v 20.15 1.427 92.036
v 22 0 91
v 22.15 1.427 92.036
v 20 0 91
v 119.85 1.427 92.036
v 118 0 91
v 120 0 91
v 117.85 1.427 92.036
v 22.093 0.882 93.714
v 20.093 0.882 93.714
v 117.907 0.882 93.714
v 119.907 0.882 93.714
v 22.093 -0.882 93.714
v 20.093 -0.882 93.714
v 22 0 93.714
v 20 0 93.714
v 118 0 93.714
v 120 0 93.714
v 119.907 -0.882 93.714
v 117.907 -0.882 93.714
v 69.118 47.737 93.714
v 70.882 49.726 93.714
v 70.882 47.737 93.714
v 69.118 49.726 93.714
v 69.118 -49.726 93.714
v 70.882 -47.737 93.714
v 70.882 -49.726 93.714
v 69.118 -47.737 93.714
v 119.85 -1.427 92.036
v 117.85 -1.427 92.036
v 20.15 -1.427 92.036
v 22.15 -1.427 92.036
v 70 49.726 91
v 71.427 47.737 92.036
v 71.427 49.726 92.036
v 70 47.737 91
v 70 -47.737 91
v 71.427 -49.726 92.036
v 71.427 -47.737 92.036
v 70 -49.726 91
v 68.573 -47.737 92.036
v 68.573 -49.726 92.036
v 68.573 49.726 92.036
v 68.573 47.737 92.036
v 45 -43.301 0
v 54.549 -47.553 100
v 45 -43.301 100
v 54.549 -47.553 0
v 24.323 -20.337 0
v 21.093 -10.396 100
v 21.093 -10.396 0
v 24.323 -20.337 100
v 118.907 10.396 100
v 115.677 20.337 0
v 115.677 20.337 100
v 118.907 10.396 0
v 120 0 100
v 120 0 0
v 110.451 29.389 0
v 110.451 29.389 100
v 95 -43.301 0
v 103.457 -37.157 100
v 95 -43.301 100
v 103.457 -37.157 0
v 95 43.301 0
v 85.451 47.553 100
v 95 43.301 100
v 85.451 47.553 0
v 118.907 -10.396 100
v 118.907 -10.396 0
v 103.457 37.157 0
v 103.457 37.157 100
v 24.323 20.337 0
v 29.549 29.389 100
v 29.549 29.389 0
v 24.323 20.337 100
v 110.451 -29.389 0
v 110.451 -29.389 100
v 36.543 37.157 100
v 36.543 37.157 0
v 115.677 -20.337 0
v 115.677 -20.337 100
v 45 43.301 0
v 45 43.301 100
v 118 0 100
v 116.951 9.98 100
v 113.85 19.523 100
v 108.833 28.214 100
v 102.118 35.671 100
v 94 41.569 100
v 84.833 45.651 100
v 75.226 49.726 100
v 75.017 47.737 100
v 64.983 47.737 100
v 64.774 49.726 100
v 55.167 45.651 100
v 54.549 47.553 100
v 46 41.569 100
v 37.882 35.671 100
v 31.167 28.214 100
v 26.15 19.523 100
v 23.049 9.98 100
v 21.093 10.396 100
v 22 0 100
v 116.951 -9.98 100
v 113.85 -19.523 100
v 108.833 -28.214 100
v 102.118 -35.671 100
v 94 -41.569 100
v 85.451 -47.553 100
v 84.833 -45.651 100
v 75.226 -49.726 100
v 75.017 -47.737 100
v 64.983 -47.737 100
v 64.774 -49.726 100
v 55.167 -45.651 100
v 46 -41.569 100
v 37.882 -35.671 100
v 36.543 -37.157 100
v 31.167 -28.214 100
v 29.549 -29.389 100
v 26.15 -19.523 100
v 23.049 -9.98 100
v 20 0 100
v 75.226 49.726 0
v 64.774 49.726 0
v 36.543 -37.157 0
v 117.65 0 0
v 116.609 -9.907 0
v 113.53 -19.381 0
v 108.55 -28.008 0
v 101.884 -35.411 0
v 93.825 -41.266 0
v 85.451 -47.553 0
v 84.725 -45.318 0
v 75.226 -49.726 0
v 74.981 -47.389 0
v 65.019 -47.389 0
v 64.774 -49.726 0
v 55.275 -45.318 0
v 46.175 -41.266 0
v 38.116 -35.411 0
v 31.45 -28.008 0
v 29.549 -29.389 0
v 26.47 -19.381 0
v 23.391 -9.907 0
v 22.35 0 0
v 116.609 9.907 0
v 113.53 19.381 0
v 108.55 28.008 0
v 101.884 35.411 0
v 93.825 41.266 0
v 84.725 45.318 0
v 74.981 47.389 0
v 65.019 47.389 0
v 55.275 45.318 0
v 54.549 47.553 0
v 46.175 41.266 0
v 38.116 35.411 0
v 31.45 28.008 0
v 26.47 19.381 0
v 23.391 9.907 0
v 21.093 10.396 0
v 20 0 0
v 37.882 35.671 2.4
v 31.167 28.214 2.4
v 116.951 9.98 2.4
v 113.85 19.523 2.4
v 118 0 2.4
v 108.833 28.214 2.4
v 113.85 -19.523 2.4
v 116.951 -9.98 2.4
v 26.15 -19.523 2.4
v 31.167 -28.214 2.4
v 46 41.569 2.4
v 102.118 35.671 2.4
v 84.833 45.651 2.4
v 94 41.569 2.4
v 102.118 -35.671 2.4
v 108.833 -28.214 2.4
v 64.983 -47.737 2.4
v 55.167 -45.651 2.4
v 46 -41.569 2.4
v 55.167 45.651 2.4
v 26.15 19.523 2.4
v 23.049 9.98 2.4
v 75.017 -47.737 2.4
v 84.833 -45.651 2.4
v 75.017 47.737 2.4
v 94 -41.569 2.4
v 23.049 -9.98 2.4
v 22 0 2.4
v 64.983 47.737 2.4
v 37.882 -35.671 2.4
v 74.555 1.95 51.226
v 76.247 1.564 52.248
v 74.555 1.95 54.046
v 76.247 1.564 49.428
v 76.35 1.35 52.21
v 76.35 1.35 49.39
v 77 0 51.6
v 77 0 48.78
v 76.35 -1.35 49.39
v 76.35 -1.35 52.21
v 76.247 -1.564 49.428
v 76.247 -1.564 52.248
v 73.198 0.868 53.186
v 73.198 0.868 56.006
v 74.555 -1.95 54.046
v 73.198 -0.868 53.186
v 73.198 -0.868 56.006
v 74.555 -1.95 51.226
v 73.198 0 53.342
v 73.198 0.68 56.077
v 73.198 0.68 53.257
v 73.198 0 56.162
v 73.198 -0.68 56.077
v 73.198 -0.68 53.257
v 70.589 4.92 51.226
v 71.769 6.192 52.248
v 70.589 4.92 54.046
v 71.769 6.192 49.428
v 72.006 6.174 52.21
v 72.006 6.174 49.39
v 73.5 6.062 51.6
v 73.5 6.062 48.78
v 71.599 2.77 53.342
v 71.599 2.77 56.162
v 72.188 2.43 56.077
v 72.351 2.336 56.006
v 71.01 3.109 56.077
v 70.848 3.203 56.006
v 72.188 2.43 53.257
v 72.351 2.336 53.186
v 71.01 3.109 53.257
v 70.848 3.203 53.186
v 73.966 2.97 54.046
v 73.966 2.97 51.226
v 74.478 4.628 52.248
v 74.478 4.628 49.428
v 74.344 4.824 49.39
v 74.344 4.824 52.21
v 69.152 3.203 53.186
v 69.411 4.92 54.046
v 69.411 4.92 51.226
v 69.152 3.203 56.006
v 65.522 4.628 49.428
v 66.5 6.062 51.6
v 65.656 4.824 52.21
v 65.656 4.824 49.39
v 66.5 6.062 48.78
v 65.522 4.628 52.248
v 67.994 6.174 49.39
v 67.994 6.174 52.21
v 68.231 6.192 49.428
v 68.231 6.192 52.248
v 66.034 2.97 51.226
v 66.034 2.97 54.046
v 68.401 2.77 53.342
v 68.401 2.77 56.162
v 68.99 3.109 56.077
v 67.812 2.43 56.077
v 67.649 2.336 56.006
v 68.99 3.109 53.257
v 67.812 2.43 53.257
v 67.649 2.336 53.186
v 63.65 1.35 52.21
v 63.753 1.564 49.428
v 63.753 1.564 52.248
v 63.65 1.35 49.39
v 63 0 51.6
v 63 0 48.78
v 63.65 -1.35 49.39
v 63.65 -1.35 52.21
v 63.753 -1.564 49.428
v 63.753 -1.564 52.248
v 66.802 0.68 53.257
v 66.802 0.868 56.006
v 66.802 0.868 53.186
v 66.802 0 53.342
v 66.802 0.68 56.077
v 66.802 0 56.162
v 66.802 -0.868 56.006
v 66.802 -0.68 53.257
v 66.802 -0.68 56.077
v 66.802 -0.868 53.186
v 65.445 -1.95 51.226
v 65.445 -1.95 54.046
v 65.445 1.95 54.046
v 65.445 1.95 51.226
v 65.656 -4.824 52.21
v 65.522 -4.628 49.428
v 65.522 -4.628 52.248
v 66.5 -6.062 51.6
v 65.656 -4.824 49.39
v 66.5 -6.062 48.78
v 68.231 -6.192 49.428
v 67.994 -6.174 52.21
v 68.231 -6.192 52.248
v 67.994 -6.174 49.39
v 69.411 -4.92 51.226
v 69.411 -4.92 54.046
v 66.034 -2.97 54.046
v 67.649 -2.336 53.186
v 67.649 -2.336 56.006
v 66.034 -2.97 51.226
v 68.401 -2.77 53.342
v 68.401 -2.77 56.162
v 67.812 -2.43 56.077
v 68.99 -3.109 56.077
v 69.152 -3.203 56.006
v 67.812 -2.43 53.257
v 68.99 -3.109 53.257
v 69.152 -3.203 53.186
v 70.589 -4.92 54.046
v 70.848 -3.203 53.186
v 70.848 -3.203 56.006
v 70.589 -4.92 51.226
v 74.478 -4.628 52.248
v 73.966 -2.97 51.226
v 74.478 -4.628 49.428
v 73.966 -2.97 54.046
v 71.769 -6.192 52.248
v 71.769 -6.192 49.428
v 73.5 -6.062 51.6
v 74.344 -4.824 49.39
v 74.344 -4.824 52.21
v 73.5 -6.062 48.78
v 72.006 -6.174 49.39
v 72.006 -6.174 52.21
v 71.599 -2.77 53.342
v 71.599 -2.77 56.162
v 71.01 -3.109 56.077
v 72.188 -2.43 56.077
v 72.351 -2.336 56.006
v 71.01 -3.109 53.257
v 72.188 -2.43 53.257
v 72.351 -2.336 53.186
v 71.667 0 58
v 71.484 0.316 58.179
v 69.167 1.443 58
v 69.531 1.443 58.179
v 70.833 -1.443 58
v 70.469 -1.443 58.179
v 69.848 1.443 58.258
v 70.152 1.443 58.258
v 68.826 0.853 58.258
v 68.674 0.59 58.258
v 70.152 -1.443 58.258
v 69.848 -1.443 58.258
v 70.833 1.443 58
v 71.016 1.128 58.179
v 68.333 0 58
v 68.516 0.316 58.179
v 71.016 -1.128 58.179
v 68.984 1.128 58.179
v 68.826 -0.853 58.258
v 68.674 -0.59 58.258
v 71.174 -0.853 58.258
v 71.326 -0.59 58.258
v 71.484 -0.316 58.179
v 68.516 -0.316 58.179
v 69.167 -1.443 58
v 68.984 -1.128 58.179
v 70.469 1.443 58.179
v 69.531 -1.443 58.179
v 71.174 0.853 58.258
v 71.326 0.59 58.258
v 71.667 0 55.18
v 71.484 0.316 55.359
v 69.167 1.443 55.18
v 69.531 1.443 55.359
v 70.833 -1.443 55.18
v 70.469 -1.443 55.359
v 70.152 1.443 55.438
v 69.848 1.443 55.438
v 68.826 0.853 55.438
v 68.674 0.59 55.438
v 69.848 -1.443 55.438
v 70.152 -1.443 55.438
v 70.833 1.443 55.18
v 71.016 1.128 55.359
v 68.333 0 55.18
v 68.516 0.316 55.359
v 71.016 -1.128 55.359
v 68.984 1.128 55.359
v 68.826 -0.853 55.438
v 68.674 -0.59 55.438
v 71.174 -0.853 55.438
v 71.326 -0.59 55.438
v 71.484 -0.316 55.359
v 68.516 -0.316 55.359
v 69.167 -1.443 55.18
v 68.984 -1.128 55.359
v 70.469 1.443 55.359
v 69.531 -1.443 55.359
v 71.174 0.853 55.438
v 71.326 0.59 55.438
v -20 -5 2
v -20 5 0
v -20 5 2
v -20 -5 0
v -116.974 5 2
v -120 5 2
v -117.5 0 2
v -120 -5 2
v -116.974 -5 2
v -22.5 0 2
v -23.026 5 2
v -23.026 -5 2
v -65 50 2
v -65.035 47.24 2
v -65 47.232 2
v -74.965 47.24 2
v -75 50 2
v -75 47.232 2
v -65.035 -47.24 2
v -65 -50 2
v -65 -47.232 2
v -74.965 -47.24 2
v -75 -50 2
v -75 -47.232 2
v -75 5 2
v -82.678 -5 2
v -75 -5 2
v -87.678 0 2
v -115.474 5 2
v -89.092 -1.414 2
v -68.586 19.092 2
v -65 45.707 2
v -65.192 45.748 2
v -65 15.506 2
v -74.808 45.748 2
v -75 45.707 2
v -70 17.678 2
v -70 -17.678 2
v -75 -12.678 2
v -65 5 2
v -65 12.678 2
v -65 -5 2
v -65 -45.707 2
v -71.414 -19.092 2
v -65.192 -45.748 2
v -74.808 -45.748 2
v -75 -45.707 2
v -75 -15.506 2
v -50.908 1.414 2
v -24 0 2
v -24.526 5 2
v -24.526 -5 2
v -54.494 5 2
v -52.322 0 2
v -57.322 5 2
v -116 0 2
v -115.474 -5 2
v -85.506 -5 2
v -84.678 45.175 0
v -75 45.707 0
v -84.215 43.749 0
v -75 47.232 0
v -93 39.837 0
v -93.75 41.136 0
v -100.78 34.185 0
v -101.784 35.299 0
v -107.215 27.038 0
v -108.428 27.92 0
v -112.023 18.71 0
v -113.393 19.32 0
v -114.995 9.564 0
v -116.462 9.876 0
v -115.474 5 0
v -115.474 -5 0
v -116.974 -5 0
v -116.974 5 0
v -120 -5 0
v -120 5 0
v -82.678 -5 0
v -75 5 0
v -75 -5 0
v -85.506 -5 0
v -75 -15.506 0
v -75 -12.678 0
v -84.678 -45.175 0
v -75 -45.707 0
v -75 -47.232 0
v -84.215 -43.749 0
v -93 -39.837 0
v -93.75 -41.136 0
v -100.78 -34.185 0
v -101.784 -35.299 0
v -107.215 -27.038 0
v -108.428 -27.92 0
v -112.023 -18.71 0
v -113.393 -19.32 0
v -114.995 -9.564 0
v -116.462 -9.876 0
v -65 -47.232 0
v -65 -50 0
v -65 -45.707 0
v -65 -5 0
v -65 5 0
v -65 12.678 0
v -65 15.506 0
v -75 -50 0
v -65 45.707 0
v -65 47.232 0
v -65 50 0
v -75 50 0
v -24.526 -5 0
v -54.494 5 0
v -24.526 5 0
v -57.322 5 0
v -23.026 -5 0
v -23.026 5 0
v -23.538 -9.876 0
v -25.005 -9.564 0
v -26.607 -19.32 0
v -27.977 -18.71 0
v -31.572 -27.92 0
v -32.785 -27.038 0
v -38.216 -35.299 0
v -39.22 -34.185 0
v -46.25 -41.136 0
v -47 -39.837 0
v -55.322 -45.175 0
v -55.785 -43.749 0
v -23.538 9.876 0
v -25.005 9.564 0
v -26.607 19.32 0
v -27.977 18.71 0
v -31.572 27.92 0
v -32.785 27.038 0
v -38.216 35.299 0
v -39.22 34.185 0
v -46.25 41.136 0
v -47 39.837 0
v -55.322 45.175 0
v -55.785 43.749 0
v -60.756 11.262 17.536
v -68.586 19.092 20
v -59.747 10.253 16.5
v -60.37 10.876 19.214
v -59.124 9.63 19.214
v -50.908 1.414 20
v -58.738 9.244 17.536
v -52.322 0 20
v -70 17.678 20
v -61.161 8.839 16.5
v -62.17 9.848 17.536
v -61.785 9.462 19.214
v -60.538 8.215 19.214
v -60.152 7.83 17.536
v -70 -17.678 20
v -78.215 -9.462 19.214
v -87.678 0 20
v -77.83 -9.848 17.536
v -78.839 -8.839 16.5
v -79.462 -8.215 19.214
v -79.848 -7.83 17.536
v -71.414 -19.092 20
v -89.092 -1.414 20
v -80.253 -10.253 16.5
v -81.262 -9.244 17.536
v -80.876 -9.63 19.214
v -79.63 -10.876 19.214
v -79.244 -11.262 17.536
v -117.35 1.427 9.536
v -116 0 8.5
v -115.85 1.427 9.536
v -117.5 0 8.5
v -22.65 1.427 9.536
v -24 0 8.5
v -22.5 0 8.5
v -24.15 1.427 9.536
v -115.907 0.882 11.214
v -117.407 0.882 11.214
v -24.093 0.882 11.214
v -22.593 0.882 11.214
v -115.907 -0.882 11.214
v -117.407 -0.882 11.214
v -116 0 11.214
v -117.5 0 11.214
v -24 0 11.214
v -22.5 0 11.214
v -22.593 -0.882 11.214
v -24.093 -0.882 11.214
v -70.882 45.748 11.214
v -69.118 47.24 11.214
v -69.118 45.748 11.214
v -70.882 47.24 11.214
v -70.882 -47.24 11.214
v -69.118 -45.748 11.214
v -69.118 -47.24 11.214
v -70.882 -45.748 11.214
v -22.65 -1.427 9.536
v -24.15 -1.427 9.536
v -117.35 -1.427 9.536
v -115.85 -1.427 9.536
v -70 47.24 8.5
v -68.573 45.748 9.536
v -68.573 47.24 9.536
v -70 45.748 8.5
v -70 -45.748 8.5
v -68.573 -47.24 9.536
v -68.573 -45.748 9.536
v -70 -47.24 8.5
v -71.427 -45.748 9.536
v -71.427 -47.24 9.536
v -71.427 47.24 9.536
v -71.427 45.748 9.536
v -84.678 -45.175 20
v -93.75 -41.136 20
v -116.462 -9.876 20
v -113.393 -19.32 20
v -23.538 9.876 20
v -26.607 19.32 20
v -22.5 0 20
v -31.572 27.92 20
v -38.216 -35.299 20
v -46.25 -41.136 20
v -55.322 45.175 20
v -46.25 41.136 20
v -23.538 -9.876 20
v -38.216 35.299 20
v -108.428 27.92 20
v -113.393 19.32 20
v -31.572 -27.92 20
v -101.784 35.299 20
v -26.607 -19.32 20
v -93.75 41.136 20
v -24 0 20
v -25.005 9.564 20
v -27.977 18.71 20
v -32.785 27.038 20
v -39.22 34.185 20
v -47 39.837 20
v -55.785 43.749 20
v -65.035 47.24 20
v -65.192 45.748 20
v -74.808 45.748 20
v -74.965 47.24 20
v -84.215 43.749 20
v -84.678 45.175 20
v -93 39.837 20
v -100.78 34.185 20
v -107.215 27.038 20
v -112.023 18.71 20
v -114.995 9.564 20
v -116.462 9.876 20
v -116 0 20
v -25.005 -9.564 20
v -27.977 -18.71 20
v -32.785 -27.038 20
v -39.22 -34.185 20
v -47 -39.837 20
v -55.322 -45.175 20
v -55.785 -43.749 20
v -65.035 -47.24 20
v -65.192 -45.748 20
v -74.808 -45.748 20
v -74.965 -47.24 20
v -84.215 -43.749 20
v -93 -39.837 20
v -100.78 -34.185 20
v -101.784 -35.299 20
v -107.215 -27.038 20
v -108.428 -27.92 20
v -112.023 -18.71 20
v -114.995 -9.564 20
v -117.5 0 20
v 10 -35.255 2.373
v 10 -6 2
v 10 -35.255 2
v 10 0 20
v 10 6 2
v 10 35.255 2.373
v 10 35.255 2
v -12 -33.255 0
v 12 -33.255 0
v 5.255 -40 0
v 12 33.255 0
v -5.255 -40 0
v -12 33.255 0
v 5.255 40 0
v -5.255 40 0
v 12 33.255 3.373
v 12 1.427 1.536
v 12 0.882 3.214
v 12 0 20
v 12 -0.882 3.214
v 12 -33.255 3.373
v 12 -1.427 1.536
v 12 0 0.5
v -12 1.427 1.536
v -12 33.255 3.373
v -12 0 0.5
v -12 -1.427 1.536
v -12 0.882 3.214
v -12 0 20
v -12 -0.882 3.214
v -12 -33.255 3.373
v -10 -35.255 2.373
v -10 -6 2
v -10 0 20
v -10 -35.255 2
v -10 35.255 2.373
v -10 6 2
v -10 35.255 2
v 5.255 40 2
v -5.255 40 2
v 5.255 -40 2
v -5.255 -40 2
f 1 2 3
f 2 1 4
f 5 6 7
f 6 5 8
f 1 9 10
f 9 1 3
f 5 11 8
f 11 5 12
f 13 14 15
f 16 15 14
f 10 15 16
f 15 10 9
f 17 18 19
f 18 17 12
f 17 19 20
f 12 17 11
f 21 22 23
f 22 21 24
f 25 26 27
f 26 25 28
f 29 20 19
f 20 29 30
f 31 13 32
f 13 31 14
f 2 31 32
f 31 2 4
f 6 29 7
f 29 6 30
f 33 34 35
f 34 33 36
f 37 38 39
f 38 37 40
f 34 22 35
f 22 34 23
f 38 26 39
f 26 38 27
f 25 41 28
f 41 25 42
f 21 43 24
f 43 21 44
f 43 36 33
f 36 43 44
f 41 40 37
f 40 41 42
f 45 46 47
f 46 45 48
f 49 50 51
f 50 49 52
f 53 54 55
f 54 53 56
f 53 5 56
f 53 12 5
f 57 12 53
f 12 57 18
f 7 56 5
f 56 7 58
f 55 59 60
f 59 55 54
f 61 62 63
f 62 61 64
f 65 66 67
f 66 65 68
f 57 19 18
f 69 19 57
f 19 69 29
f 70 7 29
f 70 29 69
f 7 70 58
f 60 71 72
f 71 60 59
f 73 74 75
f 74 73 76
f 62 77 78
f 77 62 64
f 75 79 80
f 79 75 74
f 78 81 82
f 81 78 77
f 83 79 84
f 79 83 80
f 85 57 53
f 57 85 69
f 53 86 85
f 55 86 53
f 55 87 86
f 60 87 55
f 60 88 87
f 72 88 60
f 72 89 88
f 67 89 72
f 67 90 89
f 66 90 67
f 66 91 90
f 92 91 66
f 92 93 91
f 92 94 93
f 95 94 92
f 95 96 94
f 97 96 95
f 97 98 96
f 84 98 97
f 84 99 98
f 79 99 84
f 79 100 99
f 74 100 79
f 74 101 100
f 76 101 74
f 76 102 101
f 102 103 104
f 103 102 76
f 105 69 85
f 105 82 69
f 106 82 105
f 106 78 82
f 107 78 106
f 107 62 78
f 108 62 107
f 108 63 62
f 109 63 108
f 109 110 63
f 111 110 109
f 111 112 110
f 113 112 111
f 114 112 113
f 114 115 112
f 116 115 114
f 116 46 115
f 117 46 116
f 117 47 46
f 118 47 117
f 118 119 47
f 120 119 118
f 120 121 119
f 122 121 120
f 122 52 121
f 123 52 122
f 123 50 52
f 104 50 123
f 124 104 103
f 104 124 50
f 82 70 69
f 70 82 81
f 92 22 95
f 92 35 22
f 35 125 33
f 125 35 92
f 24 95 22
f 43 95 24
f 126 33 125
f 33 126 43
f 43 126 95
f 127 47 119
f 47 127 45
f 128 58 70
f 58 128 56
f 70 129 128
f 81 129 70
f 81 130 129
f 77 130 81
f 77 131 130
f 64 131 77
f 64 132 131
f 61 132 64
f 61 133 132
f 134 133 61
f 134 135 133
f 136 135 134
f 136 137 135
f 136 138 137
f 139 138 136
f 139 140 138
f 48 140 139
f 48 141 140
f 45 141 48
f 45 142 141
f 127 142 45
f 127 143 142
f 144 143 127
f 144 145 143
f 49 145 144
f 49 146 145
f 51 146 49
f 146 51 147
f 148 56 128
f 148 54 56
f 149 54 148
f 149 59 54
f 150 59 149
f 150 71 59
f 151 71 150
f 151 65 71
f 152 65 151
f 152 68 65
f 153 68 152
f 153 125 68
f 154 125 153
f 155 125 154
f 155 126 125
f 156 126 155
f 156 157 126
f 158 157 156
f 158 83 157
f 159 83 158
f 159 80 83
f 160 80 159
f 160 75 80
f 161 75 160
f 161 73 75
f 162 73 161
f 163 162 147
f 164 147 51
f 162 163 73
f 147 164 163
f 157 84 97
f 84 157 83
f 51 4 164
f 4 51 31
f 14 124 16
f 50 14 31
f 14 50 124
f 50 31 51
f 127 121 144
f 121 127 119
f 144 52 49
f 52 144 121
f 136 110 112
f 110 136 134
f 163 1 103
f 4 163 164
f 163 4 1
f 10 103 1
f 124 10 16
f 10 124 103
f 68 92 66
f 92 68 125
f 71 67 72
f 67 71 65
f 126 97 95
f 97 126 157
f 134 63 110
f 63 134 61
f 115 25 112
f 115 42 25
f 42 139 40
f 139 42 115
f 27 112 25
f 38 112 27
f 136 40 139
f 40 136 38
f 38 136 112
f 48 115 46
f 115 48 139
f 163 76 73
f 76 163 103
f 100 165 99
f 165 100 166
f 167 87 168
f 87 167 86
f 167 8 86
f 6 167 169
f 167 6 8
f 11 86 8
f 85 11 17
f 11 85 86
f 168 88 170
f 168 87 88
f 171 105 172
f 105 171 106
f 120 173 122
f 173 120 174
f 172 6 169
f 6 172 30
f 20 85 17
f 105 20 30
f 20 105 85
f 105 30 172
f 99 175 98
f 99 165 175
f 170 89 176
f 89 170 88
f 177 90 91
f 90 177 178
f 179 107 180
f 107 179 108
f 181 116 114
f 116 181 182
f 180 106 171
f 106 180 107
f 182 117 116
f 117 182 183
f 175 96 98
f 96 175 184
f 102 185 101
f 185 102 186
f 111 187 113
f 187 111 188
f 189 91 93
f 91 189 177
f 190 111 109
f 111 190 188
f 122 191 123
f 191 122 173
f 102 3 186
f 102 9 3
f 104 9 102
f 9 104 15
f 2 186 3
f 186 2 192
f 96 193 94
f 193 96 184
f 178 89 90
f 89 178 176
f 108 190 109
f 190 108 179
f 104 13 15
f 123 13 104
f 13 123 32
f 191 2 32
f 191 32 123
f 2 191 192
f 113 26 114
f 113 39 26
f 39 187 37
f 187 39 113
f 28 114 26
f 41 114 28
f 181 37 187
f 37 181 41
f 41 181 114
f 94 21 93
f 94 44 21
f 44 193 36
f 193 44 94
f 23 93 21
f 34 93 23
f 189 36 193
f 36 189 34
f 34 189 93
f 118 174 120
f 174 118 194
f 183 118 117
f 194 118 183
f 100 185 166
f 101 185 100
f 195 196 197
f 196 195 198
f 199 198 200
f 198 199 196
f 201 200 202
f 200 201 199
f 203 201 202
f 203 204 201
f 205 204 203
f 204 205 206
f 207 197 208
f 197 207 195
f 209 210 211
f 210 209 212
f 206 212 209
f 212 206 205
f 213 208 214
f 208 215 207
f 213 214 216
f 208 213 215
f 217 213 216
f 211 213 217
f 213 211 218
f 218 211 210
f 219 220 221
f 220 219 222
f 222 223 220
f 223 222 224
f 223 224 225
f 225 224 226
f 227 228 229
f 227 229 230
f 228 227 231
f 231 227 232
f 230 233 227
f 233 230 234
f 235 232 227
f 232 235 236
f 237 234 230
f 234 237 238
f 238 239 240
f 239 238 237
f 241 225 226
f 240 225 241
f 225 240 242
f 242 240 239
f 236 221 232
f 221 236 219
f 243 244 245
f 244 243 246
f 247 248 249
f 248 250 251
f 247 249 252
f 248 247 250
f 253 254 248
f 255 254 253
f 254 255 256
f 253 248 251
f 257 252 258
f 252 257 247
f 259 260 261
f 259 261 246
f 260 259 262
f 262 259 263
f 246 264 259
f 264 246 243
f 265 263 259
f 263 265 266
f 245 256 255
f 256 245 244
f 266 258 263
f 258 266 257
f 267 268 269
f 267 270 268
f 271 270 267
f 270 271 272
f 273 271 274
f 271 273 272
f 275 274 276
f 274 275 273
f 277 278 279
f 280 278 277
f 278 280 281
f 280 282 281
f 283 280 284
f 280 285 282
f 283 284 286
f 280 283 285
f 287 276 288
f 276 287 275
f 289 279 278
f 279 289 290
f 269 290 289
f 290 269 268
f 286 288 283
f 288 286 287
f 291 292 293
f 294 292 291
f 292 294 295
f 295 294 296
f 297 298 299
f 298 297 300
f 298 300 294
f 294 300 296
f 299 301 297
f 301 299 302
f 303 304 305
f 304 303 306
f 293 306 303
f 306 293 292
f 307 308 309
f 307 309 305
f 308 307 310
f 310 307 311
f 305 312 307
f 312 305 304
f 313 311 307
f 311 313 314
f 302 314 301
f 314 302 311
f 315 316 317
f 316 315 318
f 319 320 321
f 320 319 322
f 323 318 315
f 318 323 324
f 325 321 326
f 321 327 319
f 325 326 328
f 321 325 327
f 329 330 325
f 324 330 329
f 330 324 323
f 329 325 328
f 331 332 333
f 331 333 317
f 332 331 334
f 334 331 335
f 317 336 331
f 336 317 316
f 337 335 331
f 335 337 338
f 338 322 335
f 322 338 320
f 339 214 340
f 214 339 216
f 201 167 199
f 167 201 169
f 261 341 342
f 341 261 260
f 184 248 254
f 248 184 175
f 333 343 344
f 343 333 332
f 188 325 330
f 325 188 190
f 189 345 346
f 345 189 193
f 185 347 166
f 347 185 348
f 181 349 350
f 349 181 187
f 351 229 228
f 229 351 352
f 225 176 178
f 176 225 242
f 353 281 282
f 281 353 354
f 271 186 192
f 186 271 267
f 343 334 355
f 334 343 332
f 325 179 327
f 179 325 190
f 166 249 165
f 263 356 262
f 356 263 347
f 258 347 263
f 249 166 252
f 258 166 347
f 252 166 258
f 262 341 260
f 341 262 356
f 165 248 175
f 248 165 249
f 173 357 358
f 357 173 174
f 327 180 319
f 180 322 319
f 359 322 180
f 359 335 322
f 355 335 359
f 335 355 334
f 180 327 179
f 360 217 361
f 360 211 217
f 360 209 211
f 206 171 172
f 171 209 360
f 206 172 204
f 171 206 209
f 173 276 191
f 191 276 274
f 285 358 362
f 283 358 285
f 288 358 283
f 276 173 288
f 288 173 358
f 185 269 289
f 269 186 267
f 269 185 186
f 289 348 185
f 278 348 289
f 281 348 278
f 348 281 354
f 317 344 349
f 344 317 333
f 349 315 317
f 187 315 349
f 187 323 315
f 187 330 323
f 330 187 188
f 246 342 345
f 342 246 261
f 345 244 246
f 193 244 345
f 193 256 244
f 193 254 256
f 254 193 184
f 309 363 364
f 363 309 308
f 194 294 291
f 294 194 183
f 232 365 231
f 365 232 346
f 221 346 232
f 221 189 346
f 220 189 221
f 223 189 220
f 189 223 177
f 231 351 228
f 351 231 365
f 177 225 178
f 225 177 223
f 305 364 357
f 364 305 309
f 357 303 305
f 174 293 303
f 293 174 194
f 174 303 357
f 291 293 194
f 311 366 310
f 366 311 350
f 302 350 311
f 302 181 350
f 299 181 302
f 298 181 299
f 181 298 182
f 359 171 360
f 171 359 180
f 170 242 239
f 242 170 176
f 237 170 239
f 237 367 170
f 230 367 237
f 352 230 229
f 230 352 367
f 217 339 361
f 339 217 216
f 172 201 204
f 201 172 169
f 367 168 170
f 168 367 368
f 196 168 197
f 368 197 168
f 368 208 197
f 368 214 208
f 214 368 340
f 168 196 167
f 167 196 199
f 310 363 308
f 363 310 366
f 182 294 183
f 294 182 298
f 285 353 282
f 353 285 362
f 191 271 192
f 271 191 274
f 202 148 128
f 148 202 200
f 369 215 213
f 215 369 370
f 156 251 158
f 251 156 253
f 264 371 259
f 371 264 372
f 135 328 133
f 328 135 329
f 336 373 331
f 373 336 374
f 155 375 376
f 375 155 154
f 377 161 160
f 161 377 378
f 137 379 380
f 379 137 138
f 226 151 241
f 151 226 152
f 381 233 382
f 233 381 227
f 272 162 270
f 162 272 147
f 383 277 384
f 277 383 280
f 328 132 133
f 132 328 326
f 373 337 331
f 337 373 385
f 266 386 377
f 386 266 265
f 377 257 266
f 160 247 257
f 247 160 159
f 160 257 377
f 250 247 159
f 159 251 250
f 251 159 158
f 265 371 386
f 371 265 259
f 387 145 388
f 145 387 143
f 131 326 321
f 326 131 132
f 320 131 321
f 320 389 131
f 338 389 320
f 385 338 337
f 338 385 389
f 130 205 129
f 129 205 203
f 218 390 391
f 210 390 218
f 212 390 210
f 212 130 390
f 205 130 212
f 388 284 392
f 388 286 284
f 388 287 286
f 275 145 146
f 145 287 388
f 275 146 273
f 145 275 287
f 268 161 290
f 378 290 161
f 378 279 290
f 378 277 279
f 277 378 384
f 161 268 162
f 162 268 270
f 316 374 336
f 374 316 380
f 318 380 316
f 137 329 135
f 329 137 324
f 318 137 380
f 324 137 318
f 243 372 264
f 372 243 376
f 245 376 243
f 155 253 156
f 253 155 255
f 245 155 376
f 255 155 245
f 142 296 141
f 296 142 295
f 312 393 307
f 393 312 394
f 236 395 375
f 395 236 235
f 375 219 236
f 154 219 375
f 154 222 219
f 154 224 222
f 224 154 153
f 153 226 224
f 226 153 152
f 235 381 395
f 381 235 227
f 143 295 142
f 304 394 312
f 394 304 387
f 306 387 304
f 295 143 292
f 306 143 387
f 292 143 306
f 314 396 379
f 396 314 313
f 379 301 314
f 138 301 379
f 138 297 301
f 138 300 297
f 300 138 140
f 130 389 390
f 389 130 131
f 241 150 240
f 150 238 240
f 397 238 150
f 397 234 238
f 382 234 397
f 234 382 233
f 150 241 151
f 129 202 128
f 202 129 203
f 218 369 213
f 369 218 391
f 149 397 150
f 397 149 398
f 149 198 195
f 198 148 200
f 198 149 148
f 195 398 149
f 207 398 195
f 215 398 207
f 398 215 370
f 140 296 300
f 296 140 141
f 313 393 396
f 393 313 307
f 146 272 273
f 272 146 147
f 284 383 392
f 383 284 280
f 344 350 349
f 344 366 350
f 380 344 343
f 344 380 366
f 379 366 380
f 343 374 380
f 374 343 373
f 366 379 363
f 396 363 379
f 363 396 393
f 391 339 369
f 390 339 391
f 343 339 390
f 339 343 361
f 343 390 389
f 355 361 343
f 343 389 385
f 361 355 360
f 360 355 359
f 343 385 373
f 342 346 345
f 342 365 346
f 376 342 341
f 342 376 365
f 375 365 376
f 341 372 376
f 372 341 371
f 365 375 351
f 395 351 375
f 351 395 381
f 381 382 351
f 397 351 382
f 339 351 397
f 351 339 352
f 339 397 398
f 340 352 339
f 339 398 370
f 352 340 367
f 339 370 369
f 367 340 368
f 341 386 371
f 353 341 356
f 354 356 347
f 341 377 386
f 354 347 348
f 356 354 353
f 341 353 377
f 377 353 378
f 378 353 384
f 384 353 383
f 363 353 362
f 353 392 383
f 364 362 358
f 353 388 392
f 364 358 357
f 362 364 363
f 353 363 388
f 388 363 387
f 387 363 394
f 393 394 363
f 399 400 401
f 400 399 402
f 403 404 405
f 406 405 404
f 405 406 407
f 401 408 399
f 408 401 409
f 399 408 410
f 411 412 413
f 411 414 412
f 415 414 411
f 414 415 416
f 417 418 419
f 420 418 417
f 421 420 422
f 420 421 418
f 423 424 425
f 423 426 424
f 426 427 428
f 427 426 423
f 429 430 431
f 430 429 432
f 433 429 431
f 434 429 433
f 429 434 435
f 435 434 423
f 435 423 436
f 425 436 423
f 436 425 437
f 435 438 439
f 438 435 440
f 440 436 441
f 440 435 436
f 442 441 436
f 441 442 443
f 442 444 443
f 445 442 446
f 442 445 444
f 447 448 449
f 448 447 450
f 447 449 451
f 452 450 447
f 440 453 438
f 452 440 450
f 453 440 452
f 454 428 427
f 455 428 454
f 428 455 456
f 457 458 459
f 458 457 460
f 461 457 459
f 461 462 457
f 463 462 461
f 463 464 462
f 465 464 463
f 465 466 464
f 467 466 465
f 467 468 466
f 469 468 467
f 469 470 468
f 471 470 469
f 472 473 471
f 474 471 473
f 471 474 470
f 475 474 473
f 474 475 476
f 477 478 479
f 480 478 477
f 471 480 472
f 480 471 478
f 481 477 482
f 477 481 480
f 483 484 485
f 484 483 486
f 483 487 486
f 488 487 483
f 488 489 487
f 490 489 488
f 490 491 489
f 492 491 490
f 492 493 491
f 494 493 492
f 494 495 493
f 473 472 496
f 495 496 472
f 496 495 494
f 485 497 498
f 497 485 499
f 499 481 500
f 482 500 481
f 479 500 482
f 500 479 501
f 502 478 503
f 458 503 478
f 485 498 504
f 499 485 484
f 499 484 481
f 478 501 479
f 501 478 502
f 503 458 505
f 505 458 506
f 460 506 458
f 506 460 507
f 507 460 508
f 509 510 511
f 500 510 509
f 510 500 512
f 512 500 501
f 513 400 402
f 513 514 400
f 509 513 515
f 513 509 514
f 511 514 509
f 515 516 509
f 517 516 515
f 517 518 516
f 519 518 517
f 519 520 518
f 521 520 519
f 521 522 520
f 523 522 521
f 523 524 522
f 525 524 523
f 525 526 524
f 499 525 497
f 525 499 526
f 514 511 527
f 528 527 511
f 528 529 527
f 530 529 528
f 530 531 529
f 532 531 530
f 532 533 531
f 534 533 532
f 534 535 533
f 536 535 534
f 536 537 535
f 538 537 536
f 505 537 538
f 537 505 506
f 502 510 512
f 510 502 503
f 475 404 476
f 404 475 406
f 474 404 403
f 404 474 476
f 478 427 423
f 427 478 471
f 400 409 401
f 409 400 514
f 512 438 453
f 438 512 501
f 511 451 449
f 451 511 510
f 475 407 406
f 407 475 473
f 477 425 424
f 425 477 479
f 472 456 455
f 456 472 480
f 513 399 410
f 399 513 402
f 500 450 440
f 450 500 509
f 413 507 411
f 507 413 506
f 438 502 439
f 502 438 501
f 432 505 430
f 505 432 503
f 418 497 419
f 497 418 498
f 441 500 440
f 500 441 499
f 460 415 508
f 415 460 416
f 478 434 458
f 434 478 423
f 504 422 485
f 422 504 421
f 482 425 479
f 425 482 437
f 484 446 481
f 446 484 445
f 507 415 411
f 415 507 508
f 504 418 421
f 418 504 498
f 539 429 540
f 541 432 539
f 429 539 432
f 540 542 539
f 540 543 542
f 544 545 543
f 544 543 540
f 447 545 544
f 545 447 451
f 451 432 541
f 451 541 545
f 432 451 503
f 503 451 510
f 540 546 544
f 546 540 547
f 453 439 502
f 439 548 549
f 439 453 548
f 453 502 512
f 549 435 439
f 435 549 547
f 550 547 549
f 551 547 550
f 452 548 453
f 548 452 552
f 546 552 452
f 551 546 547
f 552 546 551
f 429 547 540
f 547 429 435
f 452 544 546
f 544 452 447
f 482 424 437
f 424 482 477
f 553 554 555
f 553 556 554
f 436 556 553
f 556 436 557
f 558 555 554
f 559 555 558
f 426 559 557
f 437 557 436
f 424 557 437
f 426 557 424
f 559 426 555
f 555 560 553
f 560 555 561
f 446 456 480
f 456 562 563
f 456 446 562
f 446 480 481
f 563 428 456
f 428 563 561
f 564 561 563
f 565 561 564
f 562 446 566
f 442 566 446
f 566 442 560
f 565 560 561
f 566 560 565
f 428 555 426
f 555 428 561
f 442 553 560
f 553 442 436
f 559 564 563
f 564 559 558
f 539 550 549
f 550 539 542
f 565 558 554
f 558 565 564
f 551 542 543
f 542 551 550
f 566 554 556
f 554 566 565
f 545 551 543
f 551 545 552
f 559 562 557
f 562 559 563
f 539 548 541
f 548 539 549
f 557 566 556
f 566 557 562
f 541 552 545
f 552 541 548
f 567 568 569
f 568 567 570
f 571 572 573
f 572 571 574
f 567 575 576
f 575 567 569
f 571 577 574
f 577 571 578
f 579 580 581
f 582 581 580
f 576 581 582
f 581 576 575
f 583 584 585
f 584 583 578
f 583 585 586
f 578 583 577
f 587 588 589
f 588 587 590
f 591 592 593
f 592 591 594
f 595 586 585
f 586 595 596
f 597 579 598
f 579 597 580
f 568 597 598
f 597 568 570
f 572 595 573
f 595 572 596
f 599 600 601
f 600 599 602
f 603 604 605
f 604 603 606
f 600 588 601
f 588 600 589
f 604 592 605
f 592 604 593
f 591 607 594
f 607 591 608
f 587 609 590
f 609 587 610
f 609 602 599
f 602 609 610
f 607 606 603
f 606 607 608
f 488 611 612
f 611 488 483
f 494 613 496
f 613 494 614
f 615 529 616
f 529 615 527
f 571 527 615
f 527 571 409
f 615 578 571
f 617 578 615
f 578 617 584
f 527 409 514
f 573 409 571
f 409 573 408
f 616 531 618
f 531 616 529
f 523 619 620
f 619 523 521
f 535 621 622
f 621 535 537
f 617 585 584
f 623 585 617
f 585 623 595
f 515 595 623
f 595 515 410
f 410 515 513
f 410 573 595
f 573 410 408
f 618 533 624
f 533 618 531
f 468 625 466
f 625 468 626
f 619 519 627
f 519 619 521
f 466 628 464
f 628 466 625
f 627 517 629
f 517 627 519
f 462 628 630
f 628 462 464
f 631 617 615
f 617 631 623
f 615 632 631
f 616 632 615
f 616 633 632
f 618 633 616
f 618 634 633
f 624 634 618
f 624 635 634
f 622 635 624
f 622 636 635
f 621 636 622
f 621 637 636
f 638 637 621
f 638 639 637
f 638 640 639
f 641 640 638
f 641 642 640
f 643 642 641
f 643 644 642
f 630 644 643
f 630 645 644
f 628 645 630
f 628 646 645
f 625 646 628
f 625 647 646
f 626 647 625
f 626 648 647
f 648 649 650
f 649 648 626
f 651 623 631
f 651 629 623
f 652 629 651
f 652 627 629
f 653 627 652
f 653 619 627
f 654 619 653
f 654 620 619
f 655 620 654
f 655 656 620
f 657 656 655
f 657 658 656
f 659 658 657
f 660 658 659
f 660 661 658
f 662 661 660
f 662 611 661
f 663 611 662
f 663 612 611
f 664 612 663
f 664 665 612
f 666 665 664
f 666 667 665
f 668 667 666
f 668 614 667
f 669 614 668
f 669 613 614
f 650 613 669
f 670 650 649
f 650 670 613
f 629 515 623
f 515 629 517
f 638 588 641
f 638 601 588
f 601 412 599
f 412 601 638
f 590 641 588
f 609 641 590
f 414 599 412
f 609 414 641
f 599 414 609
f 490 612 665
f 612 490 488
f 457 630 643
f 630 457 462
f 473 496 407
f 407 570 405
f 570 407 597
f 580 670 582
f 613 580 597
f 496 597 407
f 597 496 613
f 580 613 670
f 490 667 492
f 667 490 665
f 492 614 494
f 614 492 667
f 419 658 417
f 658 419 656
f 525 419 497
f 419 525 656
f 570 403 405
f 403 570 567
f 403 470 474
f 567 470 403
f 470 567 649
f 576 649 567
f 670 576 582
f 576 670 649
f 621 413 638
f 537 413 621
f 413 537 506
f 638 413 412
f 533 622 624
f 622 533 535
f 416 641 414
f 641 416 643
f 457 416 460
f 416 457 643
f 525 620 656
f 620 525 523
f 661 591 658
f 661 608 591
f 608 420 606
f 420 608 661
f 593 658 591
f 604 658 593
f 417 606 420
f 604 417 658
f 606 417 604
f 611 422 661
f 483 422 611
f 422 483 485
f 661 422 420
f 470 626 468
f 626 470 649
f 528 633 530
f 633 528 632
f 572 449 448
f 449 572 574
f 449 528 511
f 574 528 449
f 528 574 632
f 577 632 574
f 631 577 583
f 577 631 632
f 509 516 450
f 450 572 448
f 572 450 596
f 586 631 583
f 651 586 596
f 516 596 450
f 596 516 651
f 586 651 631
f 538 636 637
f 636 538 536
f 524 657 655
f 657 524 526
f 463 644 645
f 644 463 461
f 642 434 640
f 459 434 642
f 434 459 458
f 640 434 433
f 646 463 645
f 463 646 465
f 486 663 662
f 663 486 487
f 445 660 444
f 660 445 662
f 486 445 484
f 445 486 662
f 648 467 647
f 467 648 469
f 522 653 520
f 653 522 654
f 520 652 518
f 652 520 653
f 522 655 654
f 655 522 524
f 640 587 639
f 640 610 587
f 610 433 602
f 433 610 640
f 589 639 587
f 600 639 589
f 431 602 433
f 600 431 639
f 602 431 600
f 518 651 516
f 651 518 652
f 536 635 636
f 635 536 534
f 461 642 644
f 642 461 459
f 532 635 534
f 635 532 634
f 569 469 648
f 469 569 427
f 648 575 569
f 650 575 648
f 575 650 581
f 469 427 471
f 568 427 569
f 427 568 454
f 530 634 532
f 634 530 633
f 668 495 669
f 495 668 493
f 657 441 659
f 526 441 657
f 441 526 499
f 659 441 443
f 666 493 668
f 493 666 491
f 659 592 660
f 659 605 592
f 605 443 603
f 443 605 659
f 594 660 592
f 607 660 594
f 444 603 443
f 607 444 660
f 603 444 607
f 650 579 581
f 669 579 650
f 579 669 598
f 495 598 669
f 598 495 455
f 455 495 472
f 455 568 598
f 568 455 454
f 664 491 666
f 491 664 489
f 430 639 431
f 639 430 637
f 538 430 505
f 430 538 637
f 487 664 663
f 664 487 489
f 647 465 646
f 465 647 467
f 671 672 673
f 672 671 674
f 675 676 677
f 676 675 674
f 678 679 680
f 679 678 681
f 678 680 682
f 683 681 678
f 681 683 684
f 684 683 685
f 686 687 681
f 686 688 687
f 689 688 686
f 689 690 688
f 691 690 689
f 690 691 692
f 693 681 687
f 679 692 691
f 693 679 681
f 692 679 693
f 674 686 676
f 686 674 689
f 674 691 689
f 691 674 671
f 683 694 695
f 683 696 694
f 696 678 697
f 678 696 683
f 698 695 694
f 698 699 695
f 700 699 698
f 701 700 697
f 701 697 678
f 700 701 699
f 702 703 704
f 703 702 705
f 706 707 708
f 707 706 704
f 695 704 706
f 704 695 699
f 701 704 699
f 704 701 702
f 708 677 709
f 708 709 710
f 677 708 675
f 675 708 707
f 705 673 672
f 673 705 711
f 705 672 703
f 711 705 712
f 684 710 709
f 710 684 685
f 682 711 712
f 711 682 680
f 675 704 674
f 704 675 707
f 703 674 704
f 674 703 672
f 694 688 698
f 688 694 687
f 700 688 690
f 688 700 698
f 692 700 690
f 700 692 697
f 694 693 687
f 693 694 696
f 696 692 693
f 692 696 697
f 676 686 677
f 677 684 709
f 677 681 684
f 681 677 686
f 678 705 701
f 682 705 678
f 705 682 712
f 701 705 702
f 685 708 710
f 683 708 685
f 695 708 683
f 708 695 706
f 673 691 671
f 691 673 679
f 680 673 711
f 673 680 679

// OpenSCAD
// All sizes are in mm
diameter = 100;
funnelheight = diameter*0.6;
assemblyheight = diameter;

clapperheight = 0.5*(assemblyheight-funnelheight);
clapperwidth = 0.6*(assemblyheight-funnelheight);
clapperlength = 0.8*diameter;
minordiameter = diameter/10;
thick = 2;
fudge = 0.5;

// set below to true for print layout, something else for assembly
printing = true;

square_centimeters =  diameter * diameter / 4 * 3.1415926 / 100;

echo( "Funnel surface = ",square_centimeters,"cm²");
echo( "Adding 100 milliliter of water is thus ", 1000 / square_centimeters, "mm precipitation");


if( printing )
{
	translate([.7*diameter,0,0])
		funnel();
	translate([-.7*diameter,0,0])
		base();
	clapper();
}
else
{
	color([1,1,0])
			base();
	color([1,0,1])
	difference() {
		translate([0,0,assemblyheight+thick])
		rotate([180,0,0])
			funnel();
		translate([thick, thick, 2*thick])
			cube([diameter, diameter, diameter]);
	}
	color([0,1,1])
	translate([0,0,clapperheight-2])
	rotate([30,0,45])
	translate([0,0,-2])
		clapper();
}

module funnel()
{
	union() {
		// Side walls
		difference() {
			cylinder(r=diameter/2, h=assemblyheight);
			translate([0,0,-thick])
			 	cylinder(r=diameter/2-thick, h=assemblyheight+2*thick);
			// mounting holes
			translate([0,0, assemblyheight-4*thick+fudge])
			{
				rotate([0,90,0])
						cylinder(r=1.5,h=diameter,center=true);
				rotate([90,90,0])
						cylinder(r=1.5,h=diameter,center=true);
			}
		}
		// Funnel
		difference() {
			cylinder(r1=diameter/2, r2=0, h=funnelheight);
			translate([0,0,-thick*1.41])
				cylinder(r1=diameter/2, r2=0, h=funnelheight);
			cylinder(r=minordiameter/6, h=assemblyheight);
			// Funnel holes
			for(i=[0:60:360])
				rotate([0,0,i])
				translate([minordiameter/2,0,0])
					cylinder(r=minordiameter/5, h=assemblyheight);
			
		}

	}
}


module base()
{	
	union() {
		// Cross base
		translate([0,0,thick/2])
		{
			cube([diameter,minordiameter,thick], center=true);
			cube([minordiameter,diameter,thick], center=true);
		}
		// Clapper mounting
		rotate([0,0,45])
		{
			difference()
			{	
				union() 
				{
					translate([clapperwidth/2+fudge,-diameter/8])
						cube([thick, diameter/4,clapperheight]);	
					translate([-clapperwidth/2-fudge-thick,-diameter/8])
						cube([thick, diameter/4,clapperheight]);
				}	
				translate([0,0,clapperheight-2])
					rotate([0,90,0])
						cylinder(r=1.5,h=diameter,center=true);
			}
		}
		// Funnel mounting 
		difference() {
			cylinder(r=diameter/2-thick-fudge, h=clapperheight);
			translate([0,0,-thick])
			 	cylinder(r=diameter/2-thick*2, h=clapperheight+2*thick);
			translate([0,0,5*thick])
			{
				rotate([0,90,0])
						cylinder(r=1.5,h=diameter,center=true);
				rotate([90,90,0])
						cylinder(r=1.5,h=diameter,center=true);
			}
		}
	}
}


module clapper()
{
	intersection()
	{
		difference()
		{
			translate([-clapperwidth/2,0,0]) 
			{
				union() 
				{
					//Sides
					translate([clapperwidth-thick,0,0])
					{
						vertTriangle(clapperlength,clapperheight,thick);
					} 
					vertTriangle(clapperlength,clapperheight,thick);
					//Base
					translate([0,-clapperlength/2,0])
						cube([clapperwidth,clapperlength,thick]);
					//Center
					vertTriangle(clapperlength/6,clapperheight,clapperwidth);
				}
			}
			// Mounting hole
			translate([0,0,2])
				rotate([0,90,0])
					cylinder(r=1.5,h=diameter,center=true);
		}
		// Taper ends
		rotate([0,0,45])
			scale(0.8)
			cube([clapperlength,clapperlength,clapperlength], center=true);
	}
}

module vertTriangle(base,height,thick)
{
	rotate([90,00,90])
	linear_extrude(height=thick)
	{
		polygon(points=[[-base/2,0],[base/2,0],[0,height]], paths=[[0,1,2]]);
	}
}
